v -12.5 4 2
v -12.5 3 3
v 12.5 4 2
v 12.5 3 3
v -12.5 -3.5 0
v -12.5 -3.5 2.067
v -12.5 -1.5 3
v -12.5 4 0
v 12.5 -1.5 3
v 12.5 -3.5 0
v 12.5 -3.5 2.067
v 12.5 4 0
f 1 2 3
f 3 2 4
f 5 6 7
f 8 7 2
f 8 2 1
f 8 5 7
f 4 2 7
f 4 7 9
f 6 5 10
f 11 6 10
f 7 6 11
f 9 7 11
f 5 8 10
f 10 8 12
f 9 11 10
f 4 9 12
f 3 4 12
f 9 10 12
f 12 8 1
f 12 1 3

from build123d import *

# Parameters (mm, degrees)
SKETCH_1_W      = 25
SKETCH_1_H      = 7.5
EXTRUDE_1_DEPTH = 3
CHAMFER_1_SIZE  = 1
CHAMFER_2_SIZE  = 2
CHAMFER_2_SIZE2 = 0.932615316


with BuildPart() as part:
    # Эскиз1 → Вытянуть1 (new body)
    with BuildSketch(Plane.XY):
        with Locations((0, 0.25)):
            Rectangle(SKETCH_1_W, SKETCH_1_H)
    extrude(amount=EXTRUDE_1_DEPTH)

    # Фаска1
    chamfer_1_edges = [part.edges().sort_by_distance(p)[0] for p in [
        (0, 4, 3),
    ]]
    chamfer(chamfer_1_edges, length=CHAMFER_1_SIZE)

    # Фаска2
    chamfer_2_edges = [part.edges().sort_by_distance(p)[0] for p in [
        (0, -3.5, 3),
    ]]
    chamfer_2_side = [part.faces().sort_by_distance(p)[0] for p in [
        (0, -0.25, 3),
    ]]
    chamfer(chamfer_2_edges, length=CHAMFER_2_SIZE, length2=CHAMFER_2_SIZE2, reference=chamfer_2_side[0])


solid = part.part
